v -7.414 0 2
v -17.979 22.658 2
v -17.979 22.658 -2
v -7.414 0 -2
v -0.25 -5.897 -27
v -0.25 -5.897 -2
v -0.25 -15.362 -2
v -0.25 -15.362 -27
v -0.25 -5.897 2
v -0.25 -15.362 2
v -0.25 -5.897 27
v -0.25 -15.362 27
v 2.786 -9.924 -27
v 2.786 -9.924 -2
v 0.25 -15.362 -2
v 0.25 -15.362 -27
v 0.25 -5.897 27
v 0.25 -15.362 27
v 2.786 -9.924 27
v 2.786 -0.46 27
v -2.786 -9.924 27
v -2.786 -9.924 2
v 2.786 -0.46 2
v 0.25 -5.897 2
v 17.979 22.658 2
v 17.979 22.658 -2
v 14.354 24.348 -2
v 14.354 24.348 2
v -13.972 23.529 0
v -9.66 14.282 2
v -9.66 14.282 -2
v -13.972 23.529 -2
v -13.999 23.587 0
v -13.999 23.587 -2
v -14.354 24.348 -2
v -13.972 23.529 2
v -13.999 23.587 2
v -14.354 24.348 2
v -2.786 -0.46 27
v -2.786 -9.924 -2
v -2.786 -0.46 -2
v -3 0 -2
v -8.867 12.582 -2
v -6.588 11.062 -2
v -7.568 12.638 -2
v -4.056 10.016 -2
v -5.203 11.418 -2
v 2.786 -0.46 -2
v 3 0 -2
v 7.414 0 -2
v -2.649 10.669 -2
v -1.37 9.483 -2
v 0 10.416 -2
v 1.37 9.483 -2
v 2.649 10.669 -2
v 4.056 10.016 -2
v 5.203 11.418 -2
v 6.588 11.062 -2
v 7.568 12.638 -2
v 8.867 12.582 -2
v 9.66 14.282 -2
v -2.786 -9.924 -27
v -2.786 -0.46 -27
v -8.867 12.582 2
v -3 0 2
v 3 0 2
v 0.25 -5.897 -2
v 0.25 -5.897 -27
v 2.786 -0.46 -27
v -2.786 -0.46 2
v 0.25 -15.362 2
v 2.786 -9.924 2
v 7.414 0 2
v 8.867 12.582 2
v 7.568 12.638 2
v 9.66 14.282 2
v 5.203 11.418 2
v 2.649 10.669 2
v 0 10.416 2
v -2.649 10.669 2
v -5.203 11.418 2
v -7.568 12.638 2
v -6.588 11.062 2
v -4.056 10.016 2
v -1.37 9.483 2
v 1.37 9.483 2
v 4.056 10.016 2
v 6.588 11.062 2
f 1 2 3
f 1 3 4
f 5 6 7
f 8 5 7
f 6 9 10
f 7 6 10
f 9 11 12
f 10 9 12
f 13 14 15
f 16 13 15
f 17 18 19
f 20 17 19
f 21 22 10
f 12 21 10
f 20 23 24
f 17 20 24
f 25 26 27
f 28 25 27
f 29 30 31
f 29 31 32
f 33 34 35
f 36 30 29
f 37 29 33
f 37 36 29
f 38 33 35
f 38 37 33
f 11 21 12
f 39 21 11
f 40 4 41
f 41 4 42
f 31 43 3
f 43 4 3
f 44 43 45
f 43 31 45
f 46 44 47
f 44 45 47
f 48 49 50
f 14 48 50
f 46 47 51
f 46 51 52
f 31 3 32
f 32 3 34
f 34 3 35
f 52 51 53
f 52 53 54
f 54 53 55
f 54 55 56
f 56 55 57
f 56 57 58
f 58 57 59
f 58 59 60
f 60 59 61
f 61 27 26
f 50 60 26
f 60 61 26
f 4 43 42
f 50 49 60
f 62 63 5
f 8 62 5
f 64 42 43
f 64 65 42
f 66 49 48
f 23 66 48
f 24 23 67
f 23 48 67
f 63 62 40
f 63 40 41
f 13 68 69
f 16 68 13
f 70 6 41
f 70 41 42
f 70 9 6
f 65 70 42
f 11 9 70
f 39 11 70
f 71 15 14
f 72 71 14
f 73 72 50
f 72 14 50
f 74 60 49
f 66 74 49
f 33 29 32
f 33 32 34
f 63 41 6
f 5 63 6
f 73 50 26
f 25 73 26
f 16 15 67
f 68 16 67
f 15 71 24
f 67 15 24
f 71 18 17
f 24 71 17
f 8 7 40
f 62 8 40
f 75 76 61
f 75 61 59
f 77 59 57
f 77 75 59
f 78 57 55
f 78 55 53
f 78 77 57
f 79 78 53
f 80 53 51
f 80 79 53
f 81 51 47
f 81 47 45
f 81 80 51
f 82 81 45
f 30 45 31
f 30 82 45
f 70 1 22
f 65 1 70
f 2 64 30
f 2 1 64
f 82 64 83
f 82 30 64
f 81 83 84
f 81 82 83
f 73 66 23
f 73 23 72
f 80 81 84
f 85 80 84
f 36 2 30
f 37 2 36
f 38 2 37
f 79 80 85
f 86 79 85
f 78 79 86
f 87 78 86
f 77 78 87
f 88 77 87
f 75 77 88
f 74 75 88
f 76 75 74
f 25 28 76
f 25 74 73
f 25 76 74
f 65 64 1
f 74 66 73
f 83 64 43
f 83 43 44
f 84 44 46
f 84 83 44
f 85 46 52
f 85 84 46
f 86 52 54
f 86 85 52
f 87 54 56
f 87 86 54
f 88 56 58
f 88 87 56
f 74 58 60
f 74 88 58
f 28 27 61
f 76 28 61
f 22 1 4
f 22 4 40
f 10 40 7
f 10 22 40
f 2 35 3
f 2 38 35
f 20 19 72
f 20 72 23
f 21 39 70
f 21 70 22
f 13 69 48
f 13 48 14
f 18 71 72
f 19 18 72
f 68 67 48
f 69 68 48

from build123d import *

# Parameters (mm, degrees)
F1_DEPTH  = 2
F3_DEPTH  = 4
F4_W      = 0.5
F4_H      = 15
F5_DEPTH  = 25
F6_DEPTH  = 2
F8_DEPTH  = 25
F10_DEPTH = 25


with BuildPart() as f1:
    # F0 (on Top) → F1 (new body)
    with BuildSketch(Plane.XY):
        Polygon((-7.4135116758, 0), (-0.25, -15.362200364), (-0.25, -5.8973940314), (-3, 0), (-14.3537370712, 24.3481677229), (-17.9789682194, 22.6576946759), align=None)
        Polygon((0.25, -15.362200364), (7.4135116758, 0), (17.9789682194, 22.6576946759), (14.3537370712, 24.3481677229), (3, 0), (0.25, -5.8973940314), align=None)
        Polygon((0, -15.8983270941), (0.25, -15.362200364), (0.25, -5.8973940314), (0, -6.4335207615), (-0.25, -5.8973940314), (-0.25, -15.362200364), align=None)
    extrude(amount=F1_DEPTH)

    # F2 (on face) → F3 (join)
    with BuildSketch(Plane.XY.offset(2)):
        with BuildLine():
            ThreePointArc((-8.8668911775, 12.581588732), (0, 9.4157126397), (8.8668911775, 12.581588732))
            Line((8.8668911775, 12.581588732), (9.6599709615, 14.2823538173))
            ThreePointArc((9.6599709615, 14.2823538173), (0, 10.4157126397), (-9.6599709615, 14.2823538173))
            Line((-9.6599709615, 14.2823538173), (-8.8668911775, 12.581588732))
        make_face()
        with BuildLine():
            ThreePointArc((-13.9989482009, 23.5873205351), (-12.6883090185, 17.4990569753), (-8.8668911775, 12.581588732))
            Line((-8.8668911775, 12.581588732), (-9.6599709615, 14.2823538173))
            ThreePointArc((-9.6599709615, 14.2823538173), (-12.6883090185, 18.4990569753), (-13.97191286, 23.5293430595))
            Line((-13.97191286, 23.5293430595), (-13.9989482009, 23.5873205351))
        make_face()
        with BuildLine():
            ThreePointArc((-13.97191286, 23.5293430595), (-12.6883090185, 18.4990569753), (-9.6599709615, 14.2823538173))
            Line((-9.6599709615, 14.2823538173), (-13.97191286, 23.5293430595))
        make_face()
    extrude(amount=-F3_DEPTH)

    # F4 (on face) → F5 (cut)
    with BuildSketch(Plane.XY.offset(2)):
        with Locations((0, -9.3687182158)):
            Rectangle(F4_W, F4_H)
    extrude(amount=-F5_DEPTH, mode=Mode.SUBTRACT)

    # F6 (add): faces of the model
    f6_faces = [f1.faces().sort_by_distance(p)[0] for p in [
        (-7.9421134858, 5.393960994, 0),
        (8.2425809304, 6.3306998172, 0),
    ]]
    extrude(f6_faces, amount=F6_DEPTH)

    # F7 (on face) → F8 (join)
    with BuildSketch(Plane.XY.offset(2)):
        Polygon((-0.25, -5.8973940314), (-2.7857095704, -0.4595473092), (-2.7857095704, -9.9243536418), (-0.25, -15.362200364), align=None)
        Polygon((2.7857095704, -9.9243536418), (2.7857095704, -0.4595473092), (0.25, -5.8973940314), (0.25, -15.362200364), align=None)
    extrude(amount=F8_DEPTH)

    # F9 (on face) → F10 (join)
    with BuildSketch(Plane(origin=(0, 0, -2), x_dir=(1, 0, 0), z_dir=(0, 0, -1))):
        Polygon((-0.25, 15.362200364), (-2.7857095704, 9.9243536418), (-2.7857095704, 0.4595473092), (-0.25, 5.8973940314), align=None)
        Polygon((0.25, 5.8973940314), (2.7857095704, 0.4595473092), (2.7857095704, 9.9243536418), (0.25, 15.362200364), align=None)
    extrude(amount=F10_DEPTH)


solid = f1.part
